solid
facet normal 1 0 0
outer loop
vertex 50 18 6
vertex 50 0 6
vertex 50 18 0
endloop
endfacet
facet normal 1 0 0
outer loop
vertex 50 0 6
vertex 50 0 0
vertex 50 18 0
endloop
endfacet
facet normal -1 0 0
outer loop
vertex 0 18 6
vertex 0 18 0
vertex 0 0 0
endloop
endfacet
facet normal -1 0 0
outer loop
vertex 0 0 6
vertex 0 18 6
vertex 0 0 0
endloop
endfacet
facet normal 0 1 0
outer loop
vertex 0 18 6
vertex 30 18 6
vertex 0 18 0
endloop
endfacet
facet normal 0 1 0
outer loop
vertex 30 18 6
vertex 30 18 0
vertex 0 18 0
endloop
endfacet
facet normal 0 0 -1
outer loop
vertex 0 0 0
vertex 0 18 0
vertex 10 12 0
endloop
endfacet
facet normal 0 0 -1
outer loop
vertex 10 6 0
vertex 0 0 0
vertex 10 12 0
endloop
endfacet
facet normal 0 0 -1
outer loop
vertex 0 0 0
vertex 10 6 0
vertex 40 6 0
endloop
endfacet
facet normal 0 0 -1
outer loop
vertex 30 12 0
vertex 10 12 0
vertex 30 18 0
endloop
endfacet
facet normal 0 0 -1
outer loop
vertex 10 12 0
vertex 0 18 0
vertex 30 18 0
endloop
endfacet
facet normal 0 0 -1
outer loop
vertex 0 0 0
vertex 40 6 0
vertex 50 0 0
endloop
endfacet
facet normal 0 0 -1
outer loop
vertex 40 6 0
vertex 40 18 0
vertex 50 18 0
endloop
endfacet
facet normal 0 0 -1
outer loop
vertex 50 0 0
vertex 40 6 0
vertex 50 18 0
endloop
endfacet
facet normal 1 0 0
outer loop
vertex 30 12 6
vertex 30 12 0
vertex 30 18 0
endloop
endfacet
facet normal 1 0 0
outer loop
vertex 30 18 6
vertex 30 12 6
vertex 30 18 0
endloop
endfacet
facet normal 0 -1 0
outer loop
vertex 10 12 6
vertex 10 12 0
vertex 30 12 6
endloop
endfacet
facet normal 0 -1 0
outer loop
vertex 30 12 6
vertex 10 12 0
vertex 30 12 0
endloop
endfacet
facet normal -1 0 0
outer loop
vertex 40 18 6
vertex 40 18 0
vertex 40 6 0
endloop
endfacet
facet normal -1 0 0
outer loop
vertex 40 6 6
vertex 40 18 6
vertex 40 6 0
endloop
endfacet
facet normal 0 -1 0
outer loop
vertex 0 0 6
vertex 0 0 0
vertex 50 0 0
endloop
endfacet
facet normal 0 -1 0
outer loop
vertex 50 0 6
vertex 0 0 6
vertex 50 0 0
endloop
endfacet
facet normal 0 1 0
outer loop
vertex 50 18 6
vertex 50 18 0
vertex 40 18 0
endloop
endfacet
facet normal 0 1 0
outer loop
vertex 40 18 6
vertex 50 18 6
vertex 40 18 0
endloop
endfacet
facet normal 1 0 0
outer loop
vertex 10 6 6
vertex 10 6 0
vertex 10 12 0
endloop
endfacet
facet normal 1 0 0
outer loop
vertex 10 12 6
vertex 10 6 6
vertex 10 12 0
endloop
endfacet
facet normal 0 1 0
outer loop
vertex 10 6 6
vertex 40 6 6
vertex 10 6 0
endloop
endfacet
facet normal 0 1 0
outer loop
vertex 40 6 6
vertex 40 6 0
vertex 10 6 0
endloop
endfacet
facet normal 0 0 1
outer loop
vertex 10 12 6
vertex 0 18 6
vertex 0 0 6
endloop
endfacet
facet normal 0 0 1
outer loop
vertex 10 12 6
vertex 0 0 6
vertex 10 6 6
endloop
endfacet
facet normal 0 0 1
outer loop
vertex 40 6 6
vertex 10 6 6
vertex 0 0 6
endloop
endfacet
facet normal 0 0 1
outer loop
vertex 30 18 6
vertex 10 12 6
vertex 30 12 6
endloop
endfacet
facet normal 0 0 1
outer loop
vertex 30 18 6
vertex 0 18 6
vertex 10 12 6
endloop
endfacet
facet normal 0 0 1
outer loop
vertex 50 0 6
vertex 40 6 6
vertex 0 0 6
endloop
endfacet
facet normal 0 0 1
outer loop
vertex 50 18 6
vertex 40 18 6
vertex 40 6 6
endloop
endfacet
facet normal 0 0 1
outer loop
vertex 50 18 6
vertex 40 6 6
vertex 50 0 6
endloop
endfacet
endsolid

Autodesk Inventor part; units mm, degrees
ref_plane "YZ Plane" through (0, 0, 0) normal (1, 0, 0) x (0, 1, 0)
ref_plane "XZ Plane" through (0, 0, 0) normal (0, 1, 0) x (-1, 0, 0)
ref_plane "XY Plane" through (0, 0, 0) normal (0, 0, 1) x (1, 0, 0)
sketch "Szkic1" plane through (0, 0, 0) normal (0, 0, 1) x (1, 0, 0)
  line L0 (0, 0) -> (50, 0) construction
  line L1 (50, 0) -> (50, 18) construction
  line L2 (50, 18) -> (0, 18) construction
  line L3 (0, 18) -> (0, 0) construction
  line L4 (25, 18) -> (25, 0) construction
  line L5 (0, 0) -> (0, 6) construction
  line L6 (0, 6) -> (50, 6) construction
  line L7 (50, 6) -> (50, 12) construction
  line L8 (50, 12) -> (0, 12) construction
  line L9 (0, 12) -> (0, 6) construction
  line L10 (0, 18) -> (10, 18) construction
  line L11 (10, 18) -> (10, 0) construction
  line L12 (50, 18) -> (30, 18) construction
  line L13 (30, 18) -> (30, 0) construction
  line L14 (40, 18) -> (40, 0) construction
  line L15 (0, 0) -> (50, 0)
  line L16 (50, 0) -> (50, 18)
  line L17 (50, 18) -> (40, 18)
  line L18 (40, 18) -> (40, 6)
  line L19 (40, 6) -> (10, 6)
  line L20 (10, 6) -> (10, 12)
  line L21 (10, 12) -> (30, 12)
  line L22 (30, 12) -> (30, 18)
  line L23 (30, 18) -> (0, 18)
  line L24 (0, 18) -> (0, 0)
  dimension "d1" = 18
  dimension "d2" = 6
  dimension "d3" = 6
  dimension "d4" = 10
  dimension "d5" = 20
  dimension "d8" = 20
extrude "Wyciągnięcie proste1" add sketch "Szkic1" along normal blind 6
properties part number "Zamkek_puszka"
